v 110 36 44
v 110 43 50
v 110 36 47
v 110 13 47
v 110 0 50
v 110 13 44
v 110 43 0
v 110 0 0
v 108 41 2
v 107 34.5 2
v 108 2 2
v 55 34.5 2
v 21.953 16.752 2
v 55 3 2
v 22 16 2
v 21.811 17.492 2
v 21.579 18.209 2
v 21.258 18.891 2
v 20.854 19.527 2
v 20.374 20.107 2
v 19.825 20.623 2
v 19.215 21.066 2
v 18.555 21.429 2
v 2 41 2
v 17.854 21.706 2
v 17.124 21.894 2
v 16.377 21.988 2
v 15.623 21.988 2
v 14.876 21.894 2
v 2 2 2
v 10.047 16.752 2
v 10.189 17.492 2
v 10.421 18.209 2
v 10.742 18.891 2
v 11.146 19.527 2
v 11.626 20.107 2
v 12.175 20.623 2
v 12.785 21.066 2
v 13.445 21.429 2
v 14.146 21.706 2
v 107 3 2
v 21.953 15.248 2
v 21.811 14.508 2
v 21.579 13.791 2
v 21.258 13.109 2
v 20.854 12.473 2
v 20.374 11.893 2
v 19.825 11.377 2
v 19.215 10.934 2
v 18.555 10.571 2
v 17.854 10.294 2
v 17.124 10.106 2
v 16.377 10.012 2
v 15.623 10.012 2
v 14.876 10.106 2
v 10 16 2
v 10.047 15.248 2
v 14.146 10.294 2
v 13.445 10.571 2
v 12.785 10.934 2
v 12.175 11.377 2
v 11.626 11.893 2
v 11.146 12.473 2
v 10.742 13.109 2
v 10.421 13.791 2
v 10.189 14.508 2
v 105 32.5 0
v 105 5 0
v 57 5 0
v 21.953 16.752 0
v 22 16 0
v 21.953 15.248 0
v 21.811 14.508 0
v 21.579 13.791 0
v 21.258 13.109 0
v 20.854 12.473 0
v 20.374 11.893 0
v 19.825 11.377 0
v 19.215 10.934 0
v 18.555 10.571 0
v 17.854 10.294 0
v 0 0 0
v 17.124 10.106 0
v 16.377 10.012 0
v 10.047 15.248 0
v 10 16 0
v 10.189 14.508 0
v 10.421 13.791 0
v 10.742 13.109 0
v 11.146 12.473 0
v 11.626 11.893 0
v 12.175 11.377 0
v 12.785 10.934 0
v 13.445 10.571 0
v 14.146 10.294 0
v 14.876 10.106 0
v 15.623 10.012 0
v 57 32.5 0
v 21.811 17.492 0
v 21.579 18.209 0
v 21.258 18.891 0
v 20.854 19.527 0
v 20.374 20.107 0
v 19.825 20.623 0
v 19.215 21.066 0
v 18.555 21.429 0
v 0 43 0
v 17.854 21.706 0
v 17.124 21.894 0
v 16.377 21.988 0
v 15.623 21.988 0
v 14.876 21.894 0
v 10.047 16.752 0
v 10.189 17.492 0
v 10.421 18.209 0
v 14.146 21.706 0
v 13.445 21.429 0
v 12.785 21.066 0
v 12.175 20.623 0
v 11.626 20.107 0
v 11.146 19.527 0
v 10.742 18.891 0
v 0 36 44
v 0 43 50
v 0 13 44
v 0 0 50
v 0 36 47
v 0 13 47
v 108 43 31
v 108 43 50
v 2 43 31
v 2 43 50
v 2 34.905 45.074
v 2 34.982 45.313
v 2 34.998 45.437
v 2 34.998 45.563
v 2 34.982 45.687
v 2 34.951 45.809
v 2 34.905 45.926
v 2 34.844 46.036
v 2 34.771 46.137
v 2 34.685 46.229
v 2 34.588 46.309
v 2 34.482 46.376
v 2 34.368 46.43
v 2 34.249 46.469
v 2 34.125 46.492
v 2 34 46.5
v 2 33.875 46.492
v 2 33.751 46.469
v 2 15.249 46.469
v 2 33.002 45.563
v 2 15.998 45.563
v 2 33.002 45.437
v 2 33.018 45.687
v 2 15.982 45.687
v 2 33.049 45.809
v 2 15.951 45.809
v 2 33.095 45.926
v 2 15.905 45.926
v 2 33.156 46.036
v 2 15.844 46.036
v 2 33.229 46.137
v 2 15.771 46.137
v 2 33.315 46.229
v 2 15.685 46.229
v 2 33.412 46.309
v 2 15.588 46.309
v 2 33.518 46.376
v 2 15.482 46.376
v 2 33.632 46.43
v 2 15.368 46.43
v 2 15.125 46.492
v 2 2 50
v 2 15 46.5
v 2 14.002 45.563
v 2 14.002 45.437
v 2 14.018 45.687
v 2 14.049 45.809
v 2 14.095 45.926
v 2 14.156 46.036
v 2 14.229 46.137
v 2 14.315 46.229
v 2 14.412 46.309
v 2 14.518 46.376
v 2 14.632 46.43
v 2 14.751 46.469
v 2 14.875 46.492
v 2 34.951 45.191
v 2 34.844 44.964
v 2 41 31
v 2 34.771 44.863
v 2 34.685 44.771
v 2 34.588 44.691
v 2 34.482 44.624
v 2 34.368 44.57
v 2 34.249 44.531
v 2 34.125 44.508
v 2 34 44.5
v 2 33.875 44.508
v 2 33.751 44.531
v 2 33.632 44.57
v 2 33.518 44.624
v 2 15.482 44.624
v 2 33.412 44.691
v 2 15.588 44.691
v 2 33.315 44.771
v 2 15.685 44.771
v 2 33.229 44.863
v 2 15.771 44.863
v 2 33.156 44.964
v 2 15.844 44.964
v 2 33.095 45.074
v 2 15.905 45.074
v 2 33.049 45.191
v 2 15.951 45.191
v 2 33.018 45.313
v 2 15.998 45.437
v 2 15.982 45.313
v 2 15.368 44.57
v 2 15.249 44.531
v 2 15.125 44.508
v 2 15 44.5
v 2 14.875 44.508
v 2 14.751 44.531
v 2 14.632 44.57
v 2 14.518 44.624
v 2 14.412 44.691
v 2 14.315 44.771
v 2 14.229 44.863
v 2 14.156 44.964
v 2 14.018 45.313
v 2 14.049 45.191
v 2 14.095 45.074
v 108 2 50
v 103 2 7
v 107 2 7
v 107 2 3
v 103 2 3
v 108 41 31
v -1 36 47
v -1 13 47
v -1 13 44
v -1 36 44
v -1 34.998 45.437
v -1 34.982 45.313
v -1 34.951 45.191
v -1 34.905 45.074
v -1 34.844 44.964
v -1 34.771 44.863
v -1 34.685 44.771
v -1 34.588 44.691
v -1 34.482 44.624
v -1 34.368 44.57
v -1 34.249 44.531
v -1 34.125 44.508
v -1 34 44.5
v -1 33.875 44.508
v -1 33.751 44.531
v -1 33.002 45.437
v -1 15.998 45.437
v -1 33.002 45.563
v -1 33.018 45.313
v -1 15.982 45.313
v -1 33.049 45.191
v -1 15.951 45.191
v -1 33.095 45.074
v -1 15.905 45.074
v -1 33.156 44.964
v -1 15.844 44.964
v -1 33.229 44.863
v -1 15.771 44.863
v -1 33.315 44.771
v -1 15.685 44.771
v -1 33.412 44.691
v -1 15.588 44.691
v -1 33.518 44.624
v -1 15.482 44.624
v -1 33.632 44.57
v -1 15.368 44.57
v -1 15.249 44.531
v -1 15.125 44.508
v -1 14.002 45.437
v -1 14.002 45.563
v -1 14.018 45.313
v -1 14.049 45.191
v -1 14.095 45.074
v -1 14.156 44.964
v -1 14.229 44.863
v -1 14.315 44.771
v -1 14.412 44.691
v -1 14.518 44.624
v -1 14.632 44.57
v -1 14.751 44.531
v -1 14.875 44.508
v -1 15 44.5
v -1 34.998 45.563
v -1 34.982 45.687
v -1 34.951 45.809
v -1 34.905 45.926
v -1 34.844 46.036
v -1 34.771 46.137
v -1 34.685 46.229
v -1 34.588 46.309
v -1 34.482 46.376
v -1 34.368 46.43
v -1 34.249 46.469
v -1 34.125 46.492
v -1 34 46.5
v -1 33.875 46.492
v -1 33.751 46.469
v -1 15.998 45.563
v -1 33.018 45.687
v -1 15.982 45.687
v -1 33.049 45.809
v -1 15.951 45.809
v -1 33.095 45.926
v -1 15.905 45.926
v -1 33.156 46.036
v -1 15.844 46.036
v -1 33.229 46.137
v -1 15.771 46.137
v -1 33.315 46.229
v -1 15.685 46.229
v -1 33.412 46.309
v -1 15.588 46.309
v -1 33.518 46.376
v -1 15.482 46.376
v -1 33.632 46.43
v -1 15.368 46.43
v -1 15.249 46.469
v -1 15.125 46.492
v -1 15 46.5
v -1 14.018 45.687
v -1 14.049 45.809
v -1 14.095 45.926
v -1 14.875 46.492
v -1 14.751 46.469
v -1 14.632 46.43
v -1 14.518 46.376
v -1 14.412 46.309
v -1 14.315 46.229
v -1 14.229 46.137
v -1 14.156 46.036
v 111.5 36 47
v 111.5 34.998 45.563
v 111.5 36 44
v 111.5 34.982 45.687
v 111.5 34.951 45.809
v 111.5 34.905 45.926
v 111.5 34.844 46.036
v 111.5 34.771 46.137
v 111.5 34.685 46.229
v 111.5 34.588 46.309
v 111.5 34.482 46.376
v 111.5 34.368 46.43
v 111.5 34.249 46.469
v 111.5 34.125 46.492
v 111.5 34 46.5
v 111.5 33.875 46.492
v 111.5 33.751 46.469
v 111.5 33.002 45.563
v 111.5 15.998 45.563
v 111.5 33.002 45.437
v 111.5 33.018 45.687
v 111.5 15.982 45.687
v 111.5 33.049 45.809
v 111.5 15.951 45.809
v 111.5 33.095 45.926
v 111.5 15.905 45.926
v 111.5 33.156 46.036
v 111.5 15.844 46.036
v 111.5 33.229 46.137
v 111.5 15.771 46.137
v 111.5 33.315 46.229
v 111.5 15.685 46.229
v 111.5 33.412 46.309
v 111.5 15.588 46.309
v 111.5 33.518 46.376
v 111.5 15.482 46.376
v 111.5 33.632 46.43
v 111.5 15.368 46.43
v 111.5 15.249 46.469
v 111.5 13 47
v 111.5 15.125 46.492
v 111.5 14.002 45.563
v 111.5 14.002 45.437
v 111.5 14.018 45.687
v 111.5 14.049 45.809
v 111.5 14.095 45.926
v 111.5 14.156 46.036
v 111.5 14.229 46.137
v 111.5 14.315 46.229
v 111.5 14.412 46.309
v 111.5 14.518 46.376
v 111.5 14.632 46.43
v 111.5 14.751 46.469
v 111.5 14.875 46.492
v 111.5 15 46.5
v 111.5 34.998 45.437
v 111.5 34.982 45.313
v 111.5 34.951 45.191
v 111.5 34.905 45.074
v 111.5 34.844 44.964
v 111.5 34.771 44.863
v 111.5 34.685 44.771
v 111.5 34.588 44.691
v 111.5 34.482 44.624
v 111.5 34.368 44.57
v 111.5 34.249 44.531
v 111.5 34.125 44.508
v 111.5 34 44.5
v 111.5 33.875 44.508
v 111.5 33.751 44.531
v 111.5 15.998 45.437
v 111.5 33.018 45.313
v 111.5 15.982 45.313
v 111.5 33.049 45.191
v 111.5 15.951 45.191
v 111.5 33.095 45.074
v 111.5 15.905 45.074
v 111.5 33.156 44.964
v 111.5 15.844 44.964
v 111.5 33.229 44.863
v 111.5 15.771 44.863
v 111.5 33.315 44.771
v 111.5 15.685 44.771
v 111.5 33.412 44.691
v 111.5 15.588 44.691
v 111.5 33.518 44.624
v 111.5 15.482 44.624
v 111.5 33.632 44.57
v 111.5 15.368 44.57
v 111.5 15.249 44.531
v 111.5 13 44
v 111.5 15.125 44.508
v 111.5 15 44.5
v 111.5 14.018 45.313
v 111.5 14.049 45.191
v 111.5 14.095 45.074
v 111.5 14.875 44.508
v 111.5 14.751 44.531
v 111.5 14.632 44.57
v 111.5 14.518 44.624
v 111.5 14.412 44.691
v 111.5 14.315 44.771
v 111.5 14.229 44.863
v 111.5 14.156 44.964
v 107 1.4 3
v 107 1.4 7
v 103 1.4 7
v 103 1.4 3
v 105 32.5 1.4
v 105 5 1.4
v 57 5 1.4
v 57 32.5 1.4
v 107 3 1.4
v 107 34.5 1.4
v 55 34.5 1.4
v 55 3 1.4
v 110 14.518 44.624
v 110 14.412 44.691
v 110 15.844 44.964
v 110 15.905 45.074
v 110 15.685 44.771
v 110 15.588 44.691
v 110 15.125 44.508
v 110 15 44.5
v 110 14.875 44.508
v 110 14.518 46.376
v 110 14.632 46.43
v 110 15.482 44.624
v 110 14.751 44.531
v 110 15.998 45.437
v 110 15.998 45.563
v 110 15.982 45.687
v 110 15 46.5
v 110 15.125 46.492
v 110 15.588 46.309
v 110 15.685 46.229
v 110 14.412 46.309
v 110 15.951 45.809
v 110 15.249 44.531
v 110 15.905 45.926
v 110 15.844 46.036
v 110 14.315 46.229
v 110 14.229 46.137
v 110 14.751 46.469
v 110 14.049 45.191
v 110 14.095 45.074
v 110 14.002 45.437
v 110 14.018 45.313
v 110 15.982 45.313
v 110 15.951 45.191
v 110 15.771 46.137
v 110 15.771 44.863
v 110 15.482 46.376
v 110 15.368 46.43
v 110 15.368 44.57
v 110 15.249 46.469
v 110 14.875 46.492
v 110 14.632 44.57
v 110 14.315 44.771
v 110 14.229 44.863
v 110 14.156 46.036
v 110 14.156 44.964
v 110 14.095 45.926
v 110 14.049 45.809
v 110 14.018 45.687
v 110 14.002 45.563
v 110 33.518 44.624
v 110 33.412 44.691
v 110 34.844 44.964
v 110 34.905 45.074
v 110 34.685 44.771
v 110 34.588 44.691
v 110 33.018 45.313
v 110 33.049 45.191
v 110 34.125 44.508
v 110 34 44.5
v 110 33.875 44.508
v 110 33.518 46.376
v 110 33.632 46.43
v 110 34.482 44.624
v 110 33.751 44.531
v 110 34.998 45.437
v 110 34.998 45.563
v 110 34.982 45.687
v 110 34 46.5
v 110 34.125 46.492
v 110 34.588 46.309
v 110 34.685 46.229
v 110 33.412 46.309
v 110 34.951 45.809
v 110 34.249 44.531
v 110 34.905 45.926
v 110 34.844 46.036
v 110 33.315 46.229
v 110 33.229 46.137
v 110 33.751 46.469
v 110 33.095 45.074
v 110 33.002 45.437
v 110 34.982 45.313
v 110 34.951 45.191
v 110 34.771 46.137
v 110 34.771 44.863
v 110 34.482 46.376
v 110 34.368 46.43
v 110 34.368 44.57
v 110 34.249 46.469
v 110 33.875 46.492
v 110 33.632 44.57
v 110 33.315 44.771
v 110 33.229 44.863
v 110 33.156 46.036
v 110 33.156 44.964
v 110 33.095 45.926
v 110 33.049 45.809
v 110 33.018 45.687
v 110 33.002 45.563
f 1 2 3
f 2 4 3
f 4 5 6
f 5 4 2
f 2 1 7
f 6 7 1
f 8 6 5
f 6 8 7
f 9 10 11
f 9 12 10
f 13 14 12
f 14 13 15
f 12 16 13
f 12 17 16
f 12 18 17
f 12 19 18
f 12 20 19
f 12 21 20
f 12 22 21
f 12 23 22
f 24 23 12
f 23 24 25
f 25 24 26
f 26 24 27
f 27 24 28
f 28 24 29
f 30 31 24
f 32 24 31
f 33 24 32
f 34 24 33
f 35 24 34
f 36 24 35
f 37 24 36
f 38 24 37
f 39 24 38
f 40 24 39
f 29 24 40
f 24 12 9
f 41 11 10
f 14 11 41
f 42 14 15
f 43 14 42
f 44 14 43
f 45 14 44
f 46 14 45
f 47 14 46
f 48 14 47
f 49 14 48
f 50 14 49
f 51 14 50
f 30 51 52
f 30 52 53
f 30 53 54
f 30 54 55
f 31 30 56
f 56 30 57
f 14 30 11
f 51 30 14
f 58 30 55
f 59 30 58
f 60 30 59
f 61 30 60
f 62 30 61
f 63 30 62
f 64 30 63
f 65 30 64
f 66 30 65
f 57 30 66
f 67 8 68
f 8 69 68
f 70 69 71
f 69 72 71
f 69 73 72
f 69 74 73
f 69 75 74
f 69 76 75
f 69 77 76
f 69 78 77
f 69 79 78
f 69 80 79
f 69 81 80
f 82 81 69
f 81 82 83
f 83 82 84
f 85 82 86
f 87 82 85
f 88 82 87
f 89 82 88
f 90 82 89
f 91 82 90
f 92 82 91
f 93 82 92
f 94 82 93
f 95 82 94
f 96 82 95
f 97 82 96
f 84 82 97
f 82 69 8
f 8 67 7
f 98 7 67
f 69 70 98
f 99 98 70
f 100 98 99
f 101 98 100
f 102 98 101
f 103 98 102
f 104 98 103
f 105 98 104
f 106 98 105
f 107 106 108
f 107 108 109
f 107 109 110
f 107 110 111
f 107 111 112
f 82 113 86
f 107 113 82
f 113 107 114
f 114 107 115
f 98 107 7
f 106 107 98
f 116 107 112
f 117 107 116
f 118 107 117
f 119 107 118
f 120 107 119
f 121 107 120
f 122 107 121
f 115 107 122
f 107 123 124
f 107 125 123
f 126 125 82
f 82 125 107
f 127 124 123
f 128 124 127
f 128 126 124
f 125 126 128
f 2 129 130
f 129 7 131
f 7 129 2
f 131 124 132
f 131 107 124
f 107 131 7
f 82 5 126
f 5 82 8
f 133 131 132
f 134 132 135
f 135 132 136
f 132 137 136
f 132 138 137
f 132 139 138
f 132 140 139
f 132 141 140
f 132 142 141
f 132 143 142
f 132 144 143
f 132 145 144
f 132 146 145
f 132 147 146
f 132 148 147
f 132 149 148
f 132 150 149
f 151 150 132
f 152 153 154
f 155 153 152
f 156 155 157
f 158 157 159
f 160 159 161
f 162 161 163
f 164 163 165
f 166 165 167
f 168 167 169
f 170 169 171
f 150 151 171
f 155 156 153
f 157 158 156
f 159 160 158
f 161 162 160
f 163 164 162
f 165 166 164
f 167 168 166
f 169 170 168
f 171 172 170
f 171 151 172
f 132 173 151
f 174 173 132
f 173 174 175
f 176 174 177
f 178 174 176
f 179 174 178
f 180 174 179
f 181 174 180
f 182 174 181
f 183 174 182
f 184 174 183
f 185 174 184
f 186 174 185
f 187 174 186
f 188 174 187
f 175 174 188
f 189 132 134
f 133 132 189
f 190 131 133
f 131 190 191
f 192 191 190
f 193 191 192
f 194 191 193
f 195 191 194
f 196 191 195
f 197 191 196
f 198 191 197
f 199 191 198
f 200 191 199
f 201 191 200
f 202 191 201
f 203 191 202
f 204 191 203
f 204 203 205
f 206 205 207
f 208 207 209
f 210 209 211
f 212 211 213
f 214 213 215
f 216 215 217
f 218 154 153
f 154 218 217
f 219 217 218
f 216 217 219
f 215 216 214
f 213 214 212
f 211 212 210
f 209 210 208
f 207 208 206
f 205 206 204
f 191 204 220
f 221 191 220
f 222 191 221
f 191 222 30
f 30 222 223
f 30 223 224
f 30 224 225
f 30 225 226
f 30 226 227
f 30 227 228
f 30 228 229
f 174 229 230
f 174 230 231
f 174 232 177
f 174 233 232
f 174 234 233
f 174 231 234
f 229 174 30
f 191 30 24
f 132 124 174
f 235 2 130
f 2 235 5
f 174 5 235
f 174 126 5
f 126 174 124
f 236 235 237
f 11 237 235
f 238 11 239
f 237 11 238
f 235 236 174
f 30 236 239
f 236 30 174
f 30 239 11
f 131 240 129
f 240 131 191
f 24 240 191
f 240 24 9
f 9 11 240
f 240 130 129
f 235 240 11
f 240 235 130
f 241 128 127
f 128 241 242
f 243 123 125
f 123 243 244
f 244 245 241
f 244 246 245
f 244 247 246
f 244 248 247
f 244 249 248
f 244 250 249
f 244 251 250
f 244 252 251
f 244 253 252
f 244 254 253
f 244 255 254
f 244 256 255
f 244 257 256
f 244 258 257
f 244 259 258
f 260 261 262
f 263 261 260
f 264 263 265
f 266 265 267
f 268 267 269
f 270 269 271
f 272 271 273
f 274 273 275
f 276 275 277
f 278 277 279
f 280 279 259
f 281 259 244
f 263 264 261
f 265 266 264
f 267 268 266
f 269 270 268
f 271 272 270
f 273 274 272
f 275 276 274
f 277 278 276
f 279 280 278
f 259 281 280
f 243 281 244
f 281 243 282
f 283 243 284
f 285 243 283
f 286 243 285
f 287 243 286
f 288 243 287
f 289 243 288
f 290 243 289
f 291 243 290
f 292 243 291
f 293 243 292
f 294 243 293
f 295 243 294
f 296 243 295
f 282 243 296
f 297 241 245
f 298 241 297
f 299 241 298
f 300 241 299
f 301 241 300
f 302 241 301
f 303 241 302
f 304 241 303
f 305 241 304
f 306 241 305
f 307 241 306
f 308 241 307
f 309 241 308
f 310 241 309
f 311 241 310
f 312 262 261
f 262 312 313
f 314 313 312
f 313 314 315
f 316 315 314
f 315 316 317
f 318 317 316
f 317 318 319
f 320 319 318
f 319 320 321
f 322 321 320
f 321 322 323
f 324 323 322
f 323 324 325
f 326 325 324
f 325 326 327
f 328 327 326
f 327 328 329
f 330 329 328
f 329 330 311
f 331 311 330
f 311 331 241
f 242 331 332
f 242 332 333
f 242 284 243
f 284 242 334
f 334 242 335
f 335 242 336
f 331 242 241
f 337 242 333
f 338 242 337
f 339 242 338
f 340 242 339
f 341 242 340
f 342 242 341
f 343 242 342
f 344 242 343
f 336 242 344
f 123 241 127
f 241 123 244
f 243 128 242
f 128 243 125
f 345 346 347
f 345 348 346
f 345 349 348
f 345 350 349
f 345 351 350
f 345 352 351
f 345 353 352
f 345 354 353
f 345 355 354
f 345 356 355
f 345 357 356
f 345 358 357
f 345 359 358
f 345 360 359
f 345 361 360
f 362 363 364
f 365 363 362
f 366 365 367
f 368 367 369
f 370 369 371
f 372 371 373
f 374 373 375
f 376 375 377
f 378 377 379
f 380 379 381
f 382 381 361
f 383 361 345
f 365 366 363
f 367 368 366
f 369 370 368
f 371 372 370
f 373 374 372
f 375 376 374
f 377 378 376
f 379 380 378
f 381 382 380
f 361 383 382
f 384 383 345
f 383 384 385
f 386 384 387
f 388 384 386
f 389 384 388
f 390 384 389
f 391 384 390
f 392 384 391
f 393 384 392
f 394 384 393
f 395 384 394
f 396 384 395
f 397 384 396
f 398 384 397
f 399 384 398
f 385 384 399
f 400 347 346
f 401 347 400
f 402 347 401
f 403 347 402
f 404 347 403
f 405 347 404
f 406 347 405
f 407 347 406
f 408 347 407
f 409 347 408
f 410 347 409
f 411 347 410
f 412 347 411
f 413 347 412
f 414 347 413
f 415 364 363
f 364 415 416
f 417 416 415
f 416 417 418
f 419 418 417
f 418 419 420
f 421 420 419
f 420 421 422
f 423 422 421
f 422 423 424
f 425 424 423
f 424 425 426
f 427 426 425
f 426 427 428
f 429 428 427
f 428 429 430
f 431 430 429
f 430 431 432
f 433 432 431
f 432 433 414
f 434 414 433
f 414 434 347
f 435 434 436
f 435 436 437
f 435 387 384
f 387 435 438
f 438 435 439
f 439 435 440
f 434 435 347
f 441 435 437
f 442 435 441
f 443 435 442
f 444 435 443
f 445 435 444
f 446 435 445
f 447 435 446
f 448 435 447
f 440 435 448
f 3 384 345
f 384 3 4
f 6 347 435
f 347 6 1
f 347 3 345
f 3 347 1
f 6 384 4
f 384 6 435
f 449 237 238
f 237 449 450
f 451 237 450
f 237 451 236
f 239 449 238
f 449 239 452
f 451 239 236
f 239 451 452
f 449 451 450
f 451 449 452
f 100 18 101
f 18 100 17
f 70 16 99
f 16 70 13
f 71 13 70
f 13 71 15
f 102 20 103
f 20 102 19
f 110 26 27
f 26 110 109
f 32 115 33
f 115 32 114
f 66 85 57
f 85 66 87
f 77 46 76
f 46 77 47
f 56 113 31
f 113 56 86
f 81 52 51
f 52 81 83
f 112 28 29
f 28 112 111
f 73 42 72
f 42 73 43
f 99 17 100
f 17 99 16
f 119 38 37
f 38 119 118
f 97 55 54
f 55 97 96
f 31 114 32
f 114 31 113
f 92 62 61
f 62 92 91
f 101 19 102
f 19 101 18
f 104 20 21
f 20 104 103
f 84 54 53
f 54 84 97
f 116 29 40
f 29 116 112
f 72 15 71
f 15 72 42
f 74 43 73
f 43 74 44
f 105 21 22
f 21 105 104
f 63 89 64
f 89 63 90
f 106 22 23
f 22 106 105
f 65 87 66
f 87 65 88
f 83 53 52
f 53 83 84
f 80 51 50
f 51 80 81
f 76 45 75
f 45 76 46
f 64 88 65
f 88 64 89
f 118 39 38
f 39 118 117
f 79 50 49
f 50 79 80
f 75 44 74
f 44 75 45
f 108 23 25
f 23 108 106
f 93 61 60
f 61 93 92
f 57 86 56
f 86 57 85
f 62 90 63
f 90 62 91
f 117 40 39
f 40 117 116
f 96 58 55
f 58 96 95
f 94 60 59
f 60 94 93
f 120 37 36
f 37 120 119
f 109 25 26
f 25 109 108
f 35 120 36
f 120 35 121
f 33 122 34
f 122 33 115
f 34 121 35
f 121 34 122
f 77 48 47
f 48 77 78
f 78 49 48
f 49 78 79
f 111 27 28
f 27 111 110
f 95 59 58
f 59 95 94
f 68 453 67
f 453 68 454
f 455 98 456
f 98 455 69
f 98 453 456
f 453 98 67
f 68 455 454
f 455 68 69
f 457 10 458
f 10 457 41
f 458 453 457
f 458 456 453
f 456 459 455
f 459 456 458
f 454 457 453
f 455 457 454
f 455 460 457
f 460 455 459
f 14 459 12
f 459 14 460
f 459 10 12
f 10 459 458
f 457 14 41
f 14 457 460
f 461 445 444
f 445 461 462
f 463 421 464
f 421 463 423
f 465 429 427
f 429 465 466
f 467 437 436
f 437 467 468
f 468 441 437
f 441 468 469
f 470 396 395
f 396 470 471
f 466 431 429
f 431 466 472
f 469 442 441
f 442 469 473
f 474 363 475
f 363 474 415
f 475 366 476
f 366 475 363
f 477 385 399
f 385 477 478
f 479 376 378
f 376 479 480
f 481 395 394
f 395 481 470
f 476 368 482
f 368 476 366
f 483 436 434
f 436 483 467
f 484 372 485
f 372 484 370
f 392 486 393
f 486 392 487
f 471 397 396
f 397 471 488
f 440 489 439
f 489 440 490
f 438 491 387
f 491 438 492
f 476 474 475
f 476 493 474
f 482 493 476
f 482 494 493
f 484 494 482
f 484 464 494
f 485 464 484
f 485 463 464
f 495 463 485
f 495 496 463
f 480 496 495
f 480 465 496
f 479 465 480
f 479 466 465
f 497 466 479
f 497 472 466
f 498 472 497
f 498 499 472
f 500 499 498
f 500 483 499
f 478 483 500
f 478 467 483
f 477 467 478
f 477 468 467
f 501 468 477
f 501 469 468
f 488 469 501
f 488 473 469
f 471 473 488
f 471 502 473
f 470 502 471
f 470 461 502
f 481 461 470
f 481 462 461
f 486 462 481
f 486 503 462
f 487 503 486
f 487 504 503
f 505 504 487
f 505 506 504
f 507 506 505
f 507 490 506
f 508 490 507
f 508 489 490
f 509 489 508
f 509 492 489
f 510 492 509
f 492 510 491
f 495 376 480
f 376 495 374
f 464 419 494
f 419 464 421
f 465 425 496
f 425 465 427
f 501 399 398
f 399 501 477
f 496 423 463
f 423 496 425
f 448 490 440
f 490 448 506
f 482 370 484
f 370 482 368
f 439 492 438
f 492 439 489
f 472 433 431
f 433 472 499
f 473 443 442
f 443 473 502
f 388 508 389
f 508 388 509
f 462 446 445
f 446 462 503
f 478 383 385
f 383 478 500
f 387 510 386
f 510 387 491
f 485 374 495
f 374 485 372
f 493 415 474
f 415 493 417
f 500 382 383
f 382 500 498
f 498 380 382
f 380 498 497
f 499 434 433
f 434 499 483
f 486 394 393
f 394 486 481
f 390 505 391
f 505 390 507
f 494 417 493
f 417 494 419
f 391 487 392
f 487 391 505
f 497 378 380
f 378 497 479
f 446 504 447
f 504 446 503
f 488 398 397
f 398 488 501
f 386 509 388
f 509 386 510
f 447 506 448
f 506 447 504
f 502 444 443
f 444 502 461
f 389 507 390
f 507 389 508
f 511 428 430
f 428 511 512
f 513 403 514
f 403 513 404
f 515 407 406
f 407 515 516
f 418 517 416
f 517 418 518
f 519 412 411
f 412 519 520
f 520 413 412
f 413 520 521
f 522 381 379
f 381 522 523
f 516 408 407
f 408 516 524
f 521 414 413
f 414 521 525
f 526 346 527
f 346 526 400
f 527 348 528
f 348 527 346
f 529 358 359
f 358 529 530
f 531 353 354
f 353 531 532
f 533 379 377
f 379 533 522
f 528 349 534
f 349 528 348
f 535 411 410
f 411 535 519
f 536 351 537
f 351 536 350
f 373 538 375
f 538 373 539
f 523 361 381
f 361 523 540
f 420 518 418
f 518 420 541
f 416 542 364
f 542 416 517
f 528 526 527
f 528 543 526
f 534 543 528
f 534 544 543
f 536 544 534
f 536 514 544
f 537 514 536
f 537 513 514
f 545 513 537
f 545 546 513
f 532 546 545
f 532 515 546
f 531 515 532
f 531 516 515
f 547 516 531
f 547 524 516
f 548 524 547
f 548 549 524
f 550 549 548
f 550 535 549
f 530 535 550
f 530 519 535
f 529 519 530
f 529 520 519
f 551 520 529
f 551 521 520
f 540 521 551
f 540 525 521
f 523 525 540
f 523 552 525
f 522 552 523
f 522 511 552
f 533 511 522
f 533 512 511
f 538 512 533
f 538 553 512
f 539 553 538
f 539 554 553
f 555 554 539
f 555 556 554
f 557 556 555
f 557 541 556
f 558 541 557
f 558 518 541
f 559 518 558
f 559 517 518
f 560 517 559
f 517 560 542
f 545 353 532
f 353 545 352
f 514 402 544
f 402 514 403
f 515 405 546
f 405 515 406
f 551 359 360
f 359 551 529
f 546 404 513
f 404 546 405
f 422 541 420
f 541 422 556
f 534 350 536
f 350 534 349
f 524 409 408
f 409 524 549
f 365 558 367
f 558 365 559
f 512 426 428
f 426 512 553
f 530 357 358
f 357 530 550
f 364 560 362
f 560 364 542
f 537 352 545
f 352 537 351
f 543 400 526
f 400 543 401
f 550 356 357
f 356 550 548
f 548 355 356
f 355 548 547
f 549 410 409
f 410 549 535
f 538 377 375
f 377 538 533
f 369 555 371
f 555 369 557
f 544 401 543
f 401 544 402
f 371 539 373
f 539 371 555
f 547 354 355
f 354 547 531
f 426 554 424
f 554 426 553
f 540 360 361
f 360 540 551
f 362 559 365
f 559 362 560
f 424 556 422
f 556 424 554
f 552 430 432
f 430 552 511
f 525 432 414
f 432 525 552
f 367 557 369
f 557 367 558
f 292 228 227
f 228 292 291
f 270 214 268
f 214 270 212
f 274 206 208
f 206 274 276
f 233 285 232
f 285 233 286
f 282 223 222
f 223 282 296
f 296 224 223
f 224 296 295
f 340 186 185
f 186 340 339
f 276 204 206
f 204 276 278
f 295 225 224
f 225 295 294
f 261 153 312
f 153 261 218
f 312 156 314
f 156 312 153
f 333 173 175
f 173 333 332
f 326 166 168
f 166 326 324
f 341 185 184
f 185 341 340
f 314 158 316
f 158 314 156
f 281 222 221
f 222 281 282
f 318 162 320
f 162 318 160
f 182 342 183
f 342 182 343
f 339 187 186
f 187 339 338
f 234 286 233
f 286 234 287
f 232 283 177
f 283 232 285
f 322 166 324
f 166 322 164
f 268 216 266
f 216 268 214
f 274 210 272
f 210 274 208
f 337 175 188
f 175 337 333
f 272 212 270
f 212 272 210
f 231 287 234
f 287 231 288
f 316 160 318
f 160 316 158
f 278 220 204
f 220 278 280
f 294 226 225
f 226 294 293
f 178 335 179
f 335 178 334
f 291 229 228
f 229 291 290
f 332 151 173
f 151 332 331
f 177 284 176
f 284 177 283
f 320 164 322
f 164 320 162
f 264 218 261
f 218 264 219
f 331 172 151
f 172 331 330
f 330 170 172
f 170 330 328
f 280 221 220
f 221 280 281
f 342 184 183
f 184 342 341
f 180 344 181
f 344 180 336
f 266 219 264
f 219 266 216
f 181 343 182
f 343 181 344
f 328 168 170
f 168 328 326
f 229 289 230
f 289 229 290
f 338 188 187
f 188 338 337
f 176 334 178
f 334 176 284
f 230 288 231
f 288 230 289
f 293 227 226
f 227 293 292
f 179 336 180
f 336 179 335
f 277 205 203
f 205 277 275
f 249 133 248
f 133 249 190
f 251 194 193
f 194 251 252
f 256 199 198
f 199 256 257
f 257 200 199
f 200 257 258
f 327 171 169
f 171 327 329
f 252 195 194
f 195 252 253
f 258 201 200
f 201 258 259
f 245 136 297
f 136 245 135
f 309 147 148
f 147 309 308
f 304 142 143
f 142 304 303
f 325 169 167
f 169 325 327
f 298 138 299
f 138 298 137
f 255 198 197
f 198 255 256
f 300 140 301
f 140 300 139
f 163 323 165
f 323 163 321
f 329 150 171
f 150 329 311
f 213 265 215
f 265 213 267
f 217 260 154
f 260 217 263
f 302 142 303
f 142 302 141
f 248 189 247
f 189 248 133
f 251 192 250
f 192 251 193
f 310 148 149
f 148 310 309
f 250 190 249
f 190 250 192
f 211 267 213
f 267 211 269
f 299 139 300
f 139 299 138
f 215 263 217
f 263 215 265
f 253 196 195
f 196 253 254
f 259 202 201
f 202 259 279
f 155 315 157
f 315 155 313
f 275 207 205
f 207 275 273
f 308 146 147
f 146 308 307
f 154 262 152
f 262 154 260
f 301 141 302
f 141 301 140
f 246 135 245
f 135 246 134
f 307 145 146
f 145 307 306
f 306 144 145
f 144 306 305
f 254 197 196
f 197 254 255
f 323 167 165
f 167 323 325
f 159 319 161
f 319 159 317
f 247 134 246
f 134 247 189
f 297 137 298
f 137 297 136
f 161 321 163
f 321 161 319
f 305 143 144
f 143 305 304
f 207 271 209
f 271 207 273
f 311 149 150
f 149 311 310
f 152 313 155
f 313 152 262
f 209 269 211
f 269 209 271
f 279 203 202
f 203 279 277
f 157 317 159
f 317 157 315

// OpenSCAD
/*************************************************************************************************
Power Supply Terminal Cover for the power supply commonly used with the Bukobot and other 3d printers
Author: Mike Thompson (thingiverse: mike_linus)
Date Last Modified: 11/03/2013 4:19pm
Description: simply change the cutout parameters to suit. Note: do not change length, height, depth and thickness parameters for the base unless you want to change the core dimensions.
**************************************************************************************************/


//***************************************************************
//change these cutout parameters to suit you own switch size etc.
//***************************************************************

// Length of a cutout for a switch on top
switch_cutout_length=0;
// Width of the same cutout
switch_cutout_width=0;
// Allowed thickness for the snap in switch to mount propperly
switch_cutout_thickness=1.4;

// Radius of hole for power LED 
led_cutout_radius=0;
// Radius of gromet for cables on the front.
grommet_cutout_radius=6;

// Length of snapin power plug cutout
power_plug_cutout_length=48;
// Widht of the same cutout
power_plug_cutout_width=27.5;
// Allowed thickness for the snap in panel to mount propperly
power_plug_cutout_thickness=1.4;
// Radius of screw holes in the side
screw_hole_cutout_radius=1;

// The inside distance between the two sides of the psu
base_length=110;
// The height of the gap in the PSU. Meassure from the PCB up
base_height=43;
// The depth you want your cover to be. More depth = more space for cables
base_depth=50;
// The thickness of all walls, except for around the cutouts.
base_thickness=2;
// Meassure from the end of the PSU to where the top shroud starts.
base_overlap=19;


/* [hidden] */
//***************************************************************
//don't change these base parameters unless you want to change the core dimensions.
//***************************************************************
hole_resolution=50;
$fn=hole_resolution;
cutout_flange_width=2;



module base(){
cube([base_length,base_height,base_thickness]);
cube([base_thickness,base_height,base_depth]);
cube([base_length,base_thickness,base_depth]);
translate([0,base_height-base_thickness,0])cube([
  base_length,
  base_thickness,
  base_depth-base_overlap
  ]);//Bottom plate for extended covers
translate([base_length-base_thickness,0,0])cube([
  base_thickness,
  base_height,
  base_depth]);
translate([-1,13,base_depth-6])cube([1.5,23,3]);//slot retainer
translate([base_length,13,base_depth-6])cube([1.5,23,3]);//slot retainer
}

difference(){
base();
#translate([base_length-switch_cutout_length-5,0,5])cube([
  switch_cutout_length,
  base_thickness,
  switch_cutout_width]);  //switch cutout
 
#translate([base_length-switch_cutout_length-5-cutout_flange_width,switch_cutout_thickness,5-cutout_flange_width]) cube([
  switch_cutout_length+cutout_flange_width*2,
  base_thickness,
  switch_cutout_width+cutout_flange_width*2]);

translate([8,3,9])rotate([90,0,0])cylinder(r=led_cutout_radius,h=5);  //led cutout
#translate([10+grommet_cutout_radius,10+grommet_cutout_radius,0])cylinder(r=grommet_cutout_radius,h=5);  // Power out cutout
  
#translate([base_length-power_plug_cutout_length-5,5,0])cube([
  power_plug_cutout_length,
  power_plug_cutout_width,
  base_thickness]);//240v plug cutout

#translate([base_length-power_plug_cutout_length-5-cutout_flange_width,5-cutout_flange_width,power_plug_cutout_thickness]) cube([
  power_plug_cutout_length+cutout_flange_width*2,
  power_plug_cutout_width+cutout_flange_width*2,
  base_thickness-power_plug_cutout_thickness]);  

//translate([7.5,12.75,0])cylinder(r=screw_hole_cutout_radius,h=5);  //240v plug screw hole
//translate([48,12.75,0])cylinder(r=screw_hole_cutout_radius,h=5);  //240v plug screw hole
translate([base_length,15,base_depth-6+1.5])rotate([0,90,0])cylinder(r=screw_hole_cutout_radius,h=5);  //retainer screw hole
translate([base_length,34,base_depth-6+1.5])rotate([0,90,0])cylinder(r=screw_hole_cutout_radius,h=5);  //retainer screw hole
translate([-1,15,base_depth-6+1.5])rotate([0,90,0])cylinder(r=screw_hole_cutout_radius,h=5);  //retainer screw hole
translate([-1,34,base_depth-6+1.5])rotate([0,90,0])cylinder(r=screw_hole_cutout_radius,h=5);  //retainer screw hole
}
